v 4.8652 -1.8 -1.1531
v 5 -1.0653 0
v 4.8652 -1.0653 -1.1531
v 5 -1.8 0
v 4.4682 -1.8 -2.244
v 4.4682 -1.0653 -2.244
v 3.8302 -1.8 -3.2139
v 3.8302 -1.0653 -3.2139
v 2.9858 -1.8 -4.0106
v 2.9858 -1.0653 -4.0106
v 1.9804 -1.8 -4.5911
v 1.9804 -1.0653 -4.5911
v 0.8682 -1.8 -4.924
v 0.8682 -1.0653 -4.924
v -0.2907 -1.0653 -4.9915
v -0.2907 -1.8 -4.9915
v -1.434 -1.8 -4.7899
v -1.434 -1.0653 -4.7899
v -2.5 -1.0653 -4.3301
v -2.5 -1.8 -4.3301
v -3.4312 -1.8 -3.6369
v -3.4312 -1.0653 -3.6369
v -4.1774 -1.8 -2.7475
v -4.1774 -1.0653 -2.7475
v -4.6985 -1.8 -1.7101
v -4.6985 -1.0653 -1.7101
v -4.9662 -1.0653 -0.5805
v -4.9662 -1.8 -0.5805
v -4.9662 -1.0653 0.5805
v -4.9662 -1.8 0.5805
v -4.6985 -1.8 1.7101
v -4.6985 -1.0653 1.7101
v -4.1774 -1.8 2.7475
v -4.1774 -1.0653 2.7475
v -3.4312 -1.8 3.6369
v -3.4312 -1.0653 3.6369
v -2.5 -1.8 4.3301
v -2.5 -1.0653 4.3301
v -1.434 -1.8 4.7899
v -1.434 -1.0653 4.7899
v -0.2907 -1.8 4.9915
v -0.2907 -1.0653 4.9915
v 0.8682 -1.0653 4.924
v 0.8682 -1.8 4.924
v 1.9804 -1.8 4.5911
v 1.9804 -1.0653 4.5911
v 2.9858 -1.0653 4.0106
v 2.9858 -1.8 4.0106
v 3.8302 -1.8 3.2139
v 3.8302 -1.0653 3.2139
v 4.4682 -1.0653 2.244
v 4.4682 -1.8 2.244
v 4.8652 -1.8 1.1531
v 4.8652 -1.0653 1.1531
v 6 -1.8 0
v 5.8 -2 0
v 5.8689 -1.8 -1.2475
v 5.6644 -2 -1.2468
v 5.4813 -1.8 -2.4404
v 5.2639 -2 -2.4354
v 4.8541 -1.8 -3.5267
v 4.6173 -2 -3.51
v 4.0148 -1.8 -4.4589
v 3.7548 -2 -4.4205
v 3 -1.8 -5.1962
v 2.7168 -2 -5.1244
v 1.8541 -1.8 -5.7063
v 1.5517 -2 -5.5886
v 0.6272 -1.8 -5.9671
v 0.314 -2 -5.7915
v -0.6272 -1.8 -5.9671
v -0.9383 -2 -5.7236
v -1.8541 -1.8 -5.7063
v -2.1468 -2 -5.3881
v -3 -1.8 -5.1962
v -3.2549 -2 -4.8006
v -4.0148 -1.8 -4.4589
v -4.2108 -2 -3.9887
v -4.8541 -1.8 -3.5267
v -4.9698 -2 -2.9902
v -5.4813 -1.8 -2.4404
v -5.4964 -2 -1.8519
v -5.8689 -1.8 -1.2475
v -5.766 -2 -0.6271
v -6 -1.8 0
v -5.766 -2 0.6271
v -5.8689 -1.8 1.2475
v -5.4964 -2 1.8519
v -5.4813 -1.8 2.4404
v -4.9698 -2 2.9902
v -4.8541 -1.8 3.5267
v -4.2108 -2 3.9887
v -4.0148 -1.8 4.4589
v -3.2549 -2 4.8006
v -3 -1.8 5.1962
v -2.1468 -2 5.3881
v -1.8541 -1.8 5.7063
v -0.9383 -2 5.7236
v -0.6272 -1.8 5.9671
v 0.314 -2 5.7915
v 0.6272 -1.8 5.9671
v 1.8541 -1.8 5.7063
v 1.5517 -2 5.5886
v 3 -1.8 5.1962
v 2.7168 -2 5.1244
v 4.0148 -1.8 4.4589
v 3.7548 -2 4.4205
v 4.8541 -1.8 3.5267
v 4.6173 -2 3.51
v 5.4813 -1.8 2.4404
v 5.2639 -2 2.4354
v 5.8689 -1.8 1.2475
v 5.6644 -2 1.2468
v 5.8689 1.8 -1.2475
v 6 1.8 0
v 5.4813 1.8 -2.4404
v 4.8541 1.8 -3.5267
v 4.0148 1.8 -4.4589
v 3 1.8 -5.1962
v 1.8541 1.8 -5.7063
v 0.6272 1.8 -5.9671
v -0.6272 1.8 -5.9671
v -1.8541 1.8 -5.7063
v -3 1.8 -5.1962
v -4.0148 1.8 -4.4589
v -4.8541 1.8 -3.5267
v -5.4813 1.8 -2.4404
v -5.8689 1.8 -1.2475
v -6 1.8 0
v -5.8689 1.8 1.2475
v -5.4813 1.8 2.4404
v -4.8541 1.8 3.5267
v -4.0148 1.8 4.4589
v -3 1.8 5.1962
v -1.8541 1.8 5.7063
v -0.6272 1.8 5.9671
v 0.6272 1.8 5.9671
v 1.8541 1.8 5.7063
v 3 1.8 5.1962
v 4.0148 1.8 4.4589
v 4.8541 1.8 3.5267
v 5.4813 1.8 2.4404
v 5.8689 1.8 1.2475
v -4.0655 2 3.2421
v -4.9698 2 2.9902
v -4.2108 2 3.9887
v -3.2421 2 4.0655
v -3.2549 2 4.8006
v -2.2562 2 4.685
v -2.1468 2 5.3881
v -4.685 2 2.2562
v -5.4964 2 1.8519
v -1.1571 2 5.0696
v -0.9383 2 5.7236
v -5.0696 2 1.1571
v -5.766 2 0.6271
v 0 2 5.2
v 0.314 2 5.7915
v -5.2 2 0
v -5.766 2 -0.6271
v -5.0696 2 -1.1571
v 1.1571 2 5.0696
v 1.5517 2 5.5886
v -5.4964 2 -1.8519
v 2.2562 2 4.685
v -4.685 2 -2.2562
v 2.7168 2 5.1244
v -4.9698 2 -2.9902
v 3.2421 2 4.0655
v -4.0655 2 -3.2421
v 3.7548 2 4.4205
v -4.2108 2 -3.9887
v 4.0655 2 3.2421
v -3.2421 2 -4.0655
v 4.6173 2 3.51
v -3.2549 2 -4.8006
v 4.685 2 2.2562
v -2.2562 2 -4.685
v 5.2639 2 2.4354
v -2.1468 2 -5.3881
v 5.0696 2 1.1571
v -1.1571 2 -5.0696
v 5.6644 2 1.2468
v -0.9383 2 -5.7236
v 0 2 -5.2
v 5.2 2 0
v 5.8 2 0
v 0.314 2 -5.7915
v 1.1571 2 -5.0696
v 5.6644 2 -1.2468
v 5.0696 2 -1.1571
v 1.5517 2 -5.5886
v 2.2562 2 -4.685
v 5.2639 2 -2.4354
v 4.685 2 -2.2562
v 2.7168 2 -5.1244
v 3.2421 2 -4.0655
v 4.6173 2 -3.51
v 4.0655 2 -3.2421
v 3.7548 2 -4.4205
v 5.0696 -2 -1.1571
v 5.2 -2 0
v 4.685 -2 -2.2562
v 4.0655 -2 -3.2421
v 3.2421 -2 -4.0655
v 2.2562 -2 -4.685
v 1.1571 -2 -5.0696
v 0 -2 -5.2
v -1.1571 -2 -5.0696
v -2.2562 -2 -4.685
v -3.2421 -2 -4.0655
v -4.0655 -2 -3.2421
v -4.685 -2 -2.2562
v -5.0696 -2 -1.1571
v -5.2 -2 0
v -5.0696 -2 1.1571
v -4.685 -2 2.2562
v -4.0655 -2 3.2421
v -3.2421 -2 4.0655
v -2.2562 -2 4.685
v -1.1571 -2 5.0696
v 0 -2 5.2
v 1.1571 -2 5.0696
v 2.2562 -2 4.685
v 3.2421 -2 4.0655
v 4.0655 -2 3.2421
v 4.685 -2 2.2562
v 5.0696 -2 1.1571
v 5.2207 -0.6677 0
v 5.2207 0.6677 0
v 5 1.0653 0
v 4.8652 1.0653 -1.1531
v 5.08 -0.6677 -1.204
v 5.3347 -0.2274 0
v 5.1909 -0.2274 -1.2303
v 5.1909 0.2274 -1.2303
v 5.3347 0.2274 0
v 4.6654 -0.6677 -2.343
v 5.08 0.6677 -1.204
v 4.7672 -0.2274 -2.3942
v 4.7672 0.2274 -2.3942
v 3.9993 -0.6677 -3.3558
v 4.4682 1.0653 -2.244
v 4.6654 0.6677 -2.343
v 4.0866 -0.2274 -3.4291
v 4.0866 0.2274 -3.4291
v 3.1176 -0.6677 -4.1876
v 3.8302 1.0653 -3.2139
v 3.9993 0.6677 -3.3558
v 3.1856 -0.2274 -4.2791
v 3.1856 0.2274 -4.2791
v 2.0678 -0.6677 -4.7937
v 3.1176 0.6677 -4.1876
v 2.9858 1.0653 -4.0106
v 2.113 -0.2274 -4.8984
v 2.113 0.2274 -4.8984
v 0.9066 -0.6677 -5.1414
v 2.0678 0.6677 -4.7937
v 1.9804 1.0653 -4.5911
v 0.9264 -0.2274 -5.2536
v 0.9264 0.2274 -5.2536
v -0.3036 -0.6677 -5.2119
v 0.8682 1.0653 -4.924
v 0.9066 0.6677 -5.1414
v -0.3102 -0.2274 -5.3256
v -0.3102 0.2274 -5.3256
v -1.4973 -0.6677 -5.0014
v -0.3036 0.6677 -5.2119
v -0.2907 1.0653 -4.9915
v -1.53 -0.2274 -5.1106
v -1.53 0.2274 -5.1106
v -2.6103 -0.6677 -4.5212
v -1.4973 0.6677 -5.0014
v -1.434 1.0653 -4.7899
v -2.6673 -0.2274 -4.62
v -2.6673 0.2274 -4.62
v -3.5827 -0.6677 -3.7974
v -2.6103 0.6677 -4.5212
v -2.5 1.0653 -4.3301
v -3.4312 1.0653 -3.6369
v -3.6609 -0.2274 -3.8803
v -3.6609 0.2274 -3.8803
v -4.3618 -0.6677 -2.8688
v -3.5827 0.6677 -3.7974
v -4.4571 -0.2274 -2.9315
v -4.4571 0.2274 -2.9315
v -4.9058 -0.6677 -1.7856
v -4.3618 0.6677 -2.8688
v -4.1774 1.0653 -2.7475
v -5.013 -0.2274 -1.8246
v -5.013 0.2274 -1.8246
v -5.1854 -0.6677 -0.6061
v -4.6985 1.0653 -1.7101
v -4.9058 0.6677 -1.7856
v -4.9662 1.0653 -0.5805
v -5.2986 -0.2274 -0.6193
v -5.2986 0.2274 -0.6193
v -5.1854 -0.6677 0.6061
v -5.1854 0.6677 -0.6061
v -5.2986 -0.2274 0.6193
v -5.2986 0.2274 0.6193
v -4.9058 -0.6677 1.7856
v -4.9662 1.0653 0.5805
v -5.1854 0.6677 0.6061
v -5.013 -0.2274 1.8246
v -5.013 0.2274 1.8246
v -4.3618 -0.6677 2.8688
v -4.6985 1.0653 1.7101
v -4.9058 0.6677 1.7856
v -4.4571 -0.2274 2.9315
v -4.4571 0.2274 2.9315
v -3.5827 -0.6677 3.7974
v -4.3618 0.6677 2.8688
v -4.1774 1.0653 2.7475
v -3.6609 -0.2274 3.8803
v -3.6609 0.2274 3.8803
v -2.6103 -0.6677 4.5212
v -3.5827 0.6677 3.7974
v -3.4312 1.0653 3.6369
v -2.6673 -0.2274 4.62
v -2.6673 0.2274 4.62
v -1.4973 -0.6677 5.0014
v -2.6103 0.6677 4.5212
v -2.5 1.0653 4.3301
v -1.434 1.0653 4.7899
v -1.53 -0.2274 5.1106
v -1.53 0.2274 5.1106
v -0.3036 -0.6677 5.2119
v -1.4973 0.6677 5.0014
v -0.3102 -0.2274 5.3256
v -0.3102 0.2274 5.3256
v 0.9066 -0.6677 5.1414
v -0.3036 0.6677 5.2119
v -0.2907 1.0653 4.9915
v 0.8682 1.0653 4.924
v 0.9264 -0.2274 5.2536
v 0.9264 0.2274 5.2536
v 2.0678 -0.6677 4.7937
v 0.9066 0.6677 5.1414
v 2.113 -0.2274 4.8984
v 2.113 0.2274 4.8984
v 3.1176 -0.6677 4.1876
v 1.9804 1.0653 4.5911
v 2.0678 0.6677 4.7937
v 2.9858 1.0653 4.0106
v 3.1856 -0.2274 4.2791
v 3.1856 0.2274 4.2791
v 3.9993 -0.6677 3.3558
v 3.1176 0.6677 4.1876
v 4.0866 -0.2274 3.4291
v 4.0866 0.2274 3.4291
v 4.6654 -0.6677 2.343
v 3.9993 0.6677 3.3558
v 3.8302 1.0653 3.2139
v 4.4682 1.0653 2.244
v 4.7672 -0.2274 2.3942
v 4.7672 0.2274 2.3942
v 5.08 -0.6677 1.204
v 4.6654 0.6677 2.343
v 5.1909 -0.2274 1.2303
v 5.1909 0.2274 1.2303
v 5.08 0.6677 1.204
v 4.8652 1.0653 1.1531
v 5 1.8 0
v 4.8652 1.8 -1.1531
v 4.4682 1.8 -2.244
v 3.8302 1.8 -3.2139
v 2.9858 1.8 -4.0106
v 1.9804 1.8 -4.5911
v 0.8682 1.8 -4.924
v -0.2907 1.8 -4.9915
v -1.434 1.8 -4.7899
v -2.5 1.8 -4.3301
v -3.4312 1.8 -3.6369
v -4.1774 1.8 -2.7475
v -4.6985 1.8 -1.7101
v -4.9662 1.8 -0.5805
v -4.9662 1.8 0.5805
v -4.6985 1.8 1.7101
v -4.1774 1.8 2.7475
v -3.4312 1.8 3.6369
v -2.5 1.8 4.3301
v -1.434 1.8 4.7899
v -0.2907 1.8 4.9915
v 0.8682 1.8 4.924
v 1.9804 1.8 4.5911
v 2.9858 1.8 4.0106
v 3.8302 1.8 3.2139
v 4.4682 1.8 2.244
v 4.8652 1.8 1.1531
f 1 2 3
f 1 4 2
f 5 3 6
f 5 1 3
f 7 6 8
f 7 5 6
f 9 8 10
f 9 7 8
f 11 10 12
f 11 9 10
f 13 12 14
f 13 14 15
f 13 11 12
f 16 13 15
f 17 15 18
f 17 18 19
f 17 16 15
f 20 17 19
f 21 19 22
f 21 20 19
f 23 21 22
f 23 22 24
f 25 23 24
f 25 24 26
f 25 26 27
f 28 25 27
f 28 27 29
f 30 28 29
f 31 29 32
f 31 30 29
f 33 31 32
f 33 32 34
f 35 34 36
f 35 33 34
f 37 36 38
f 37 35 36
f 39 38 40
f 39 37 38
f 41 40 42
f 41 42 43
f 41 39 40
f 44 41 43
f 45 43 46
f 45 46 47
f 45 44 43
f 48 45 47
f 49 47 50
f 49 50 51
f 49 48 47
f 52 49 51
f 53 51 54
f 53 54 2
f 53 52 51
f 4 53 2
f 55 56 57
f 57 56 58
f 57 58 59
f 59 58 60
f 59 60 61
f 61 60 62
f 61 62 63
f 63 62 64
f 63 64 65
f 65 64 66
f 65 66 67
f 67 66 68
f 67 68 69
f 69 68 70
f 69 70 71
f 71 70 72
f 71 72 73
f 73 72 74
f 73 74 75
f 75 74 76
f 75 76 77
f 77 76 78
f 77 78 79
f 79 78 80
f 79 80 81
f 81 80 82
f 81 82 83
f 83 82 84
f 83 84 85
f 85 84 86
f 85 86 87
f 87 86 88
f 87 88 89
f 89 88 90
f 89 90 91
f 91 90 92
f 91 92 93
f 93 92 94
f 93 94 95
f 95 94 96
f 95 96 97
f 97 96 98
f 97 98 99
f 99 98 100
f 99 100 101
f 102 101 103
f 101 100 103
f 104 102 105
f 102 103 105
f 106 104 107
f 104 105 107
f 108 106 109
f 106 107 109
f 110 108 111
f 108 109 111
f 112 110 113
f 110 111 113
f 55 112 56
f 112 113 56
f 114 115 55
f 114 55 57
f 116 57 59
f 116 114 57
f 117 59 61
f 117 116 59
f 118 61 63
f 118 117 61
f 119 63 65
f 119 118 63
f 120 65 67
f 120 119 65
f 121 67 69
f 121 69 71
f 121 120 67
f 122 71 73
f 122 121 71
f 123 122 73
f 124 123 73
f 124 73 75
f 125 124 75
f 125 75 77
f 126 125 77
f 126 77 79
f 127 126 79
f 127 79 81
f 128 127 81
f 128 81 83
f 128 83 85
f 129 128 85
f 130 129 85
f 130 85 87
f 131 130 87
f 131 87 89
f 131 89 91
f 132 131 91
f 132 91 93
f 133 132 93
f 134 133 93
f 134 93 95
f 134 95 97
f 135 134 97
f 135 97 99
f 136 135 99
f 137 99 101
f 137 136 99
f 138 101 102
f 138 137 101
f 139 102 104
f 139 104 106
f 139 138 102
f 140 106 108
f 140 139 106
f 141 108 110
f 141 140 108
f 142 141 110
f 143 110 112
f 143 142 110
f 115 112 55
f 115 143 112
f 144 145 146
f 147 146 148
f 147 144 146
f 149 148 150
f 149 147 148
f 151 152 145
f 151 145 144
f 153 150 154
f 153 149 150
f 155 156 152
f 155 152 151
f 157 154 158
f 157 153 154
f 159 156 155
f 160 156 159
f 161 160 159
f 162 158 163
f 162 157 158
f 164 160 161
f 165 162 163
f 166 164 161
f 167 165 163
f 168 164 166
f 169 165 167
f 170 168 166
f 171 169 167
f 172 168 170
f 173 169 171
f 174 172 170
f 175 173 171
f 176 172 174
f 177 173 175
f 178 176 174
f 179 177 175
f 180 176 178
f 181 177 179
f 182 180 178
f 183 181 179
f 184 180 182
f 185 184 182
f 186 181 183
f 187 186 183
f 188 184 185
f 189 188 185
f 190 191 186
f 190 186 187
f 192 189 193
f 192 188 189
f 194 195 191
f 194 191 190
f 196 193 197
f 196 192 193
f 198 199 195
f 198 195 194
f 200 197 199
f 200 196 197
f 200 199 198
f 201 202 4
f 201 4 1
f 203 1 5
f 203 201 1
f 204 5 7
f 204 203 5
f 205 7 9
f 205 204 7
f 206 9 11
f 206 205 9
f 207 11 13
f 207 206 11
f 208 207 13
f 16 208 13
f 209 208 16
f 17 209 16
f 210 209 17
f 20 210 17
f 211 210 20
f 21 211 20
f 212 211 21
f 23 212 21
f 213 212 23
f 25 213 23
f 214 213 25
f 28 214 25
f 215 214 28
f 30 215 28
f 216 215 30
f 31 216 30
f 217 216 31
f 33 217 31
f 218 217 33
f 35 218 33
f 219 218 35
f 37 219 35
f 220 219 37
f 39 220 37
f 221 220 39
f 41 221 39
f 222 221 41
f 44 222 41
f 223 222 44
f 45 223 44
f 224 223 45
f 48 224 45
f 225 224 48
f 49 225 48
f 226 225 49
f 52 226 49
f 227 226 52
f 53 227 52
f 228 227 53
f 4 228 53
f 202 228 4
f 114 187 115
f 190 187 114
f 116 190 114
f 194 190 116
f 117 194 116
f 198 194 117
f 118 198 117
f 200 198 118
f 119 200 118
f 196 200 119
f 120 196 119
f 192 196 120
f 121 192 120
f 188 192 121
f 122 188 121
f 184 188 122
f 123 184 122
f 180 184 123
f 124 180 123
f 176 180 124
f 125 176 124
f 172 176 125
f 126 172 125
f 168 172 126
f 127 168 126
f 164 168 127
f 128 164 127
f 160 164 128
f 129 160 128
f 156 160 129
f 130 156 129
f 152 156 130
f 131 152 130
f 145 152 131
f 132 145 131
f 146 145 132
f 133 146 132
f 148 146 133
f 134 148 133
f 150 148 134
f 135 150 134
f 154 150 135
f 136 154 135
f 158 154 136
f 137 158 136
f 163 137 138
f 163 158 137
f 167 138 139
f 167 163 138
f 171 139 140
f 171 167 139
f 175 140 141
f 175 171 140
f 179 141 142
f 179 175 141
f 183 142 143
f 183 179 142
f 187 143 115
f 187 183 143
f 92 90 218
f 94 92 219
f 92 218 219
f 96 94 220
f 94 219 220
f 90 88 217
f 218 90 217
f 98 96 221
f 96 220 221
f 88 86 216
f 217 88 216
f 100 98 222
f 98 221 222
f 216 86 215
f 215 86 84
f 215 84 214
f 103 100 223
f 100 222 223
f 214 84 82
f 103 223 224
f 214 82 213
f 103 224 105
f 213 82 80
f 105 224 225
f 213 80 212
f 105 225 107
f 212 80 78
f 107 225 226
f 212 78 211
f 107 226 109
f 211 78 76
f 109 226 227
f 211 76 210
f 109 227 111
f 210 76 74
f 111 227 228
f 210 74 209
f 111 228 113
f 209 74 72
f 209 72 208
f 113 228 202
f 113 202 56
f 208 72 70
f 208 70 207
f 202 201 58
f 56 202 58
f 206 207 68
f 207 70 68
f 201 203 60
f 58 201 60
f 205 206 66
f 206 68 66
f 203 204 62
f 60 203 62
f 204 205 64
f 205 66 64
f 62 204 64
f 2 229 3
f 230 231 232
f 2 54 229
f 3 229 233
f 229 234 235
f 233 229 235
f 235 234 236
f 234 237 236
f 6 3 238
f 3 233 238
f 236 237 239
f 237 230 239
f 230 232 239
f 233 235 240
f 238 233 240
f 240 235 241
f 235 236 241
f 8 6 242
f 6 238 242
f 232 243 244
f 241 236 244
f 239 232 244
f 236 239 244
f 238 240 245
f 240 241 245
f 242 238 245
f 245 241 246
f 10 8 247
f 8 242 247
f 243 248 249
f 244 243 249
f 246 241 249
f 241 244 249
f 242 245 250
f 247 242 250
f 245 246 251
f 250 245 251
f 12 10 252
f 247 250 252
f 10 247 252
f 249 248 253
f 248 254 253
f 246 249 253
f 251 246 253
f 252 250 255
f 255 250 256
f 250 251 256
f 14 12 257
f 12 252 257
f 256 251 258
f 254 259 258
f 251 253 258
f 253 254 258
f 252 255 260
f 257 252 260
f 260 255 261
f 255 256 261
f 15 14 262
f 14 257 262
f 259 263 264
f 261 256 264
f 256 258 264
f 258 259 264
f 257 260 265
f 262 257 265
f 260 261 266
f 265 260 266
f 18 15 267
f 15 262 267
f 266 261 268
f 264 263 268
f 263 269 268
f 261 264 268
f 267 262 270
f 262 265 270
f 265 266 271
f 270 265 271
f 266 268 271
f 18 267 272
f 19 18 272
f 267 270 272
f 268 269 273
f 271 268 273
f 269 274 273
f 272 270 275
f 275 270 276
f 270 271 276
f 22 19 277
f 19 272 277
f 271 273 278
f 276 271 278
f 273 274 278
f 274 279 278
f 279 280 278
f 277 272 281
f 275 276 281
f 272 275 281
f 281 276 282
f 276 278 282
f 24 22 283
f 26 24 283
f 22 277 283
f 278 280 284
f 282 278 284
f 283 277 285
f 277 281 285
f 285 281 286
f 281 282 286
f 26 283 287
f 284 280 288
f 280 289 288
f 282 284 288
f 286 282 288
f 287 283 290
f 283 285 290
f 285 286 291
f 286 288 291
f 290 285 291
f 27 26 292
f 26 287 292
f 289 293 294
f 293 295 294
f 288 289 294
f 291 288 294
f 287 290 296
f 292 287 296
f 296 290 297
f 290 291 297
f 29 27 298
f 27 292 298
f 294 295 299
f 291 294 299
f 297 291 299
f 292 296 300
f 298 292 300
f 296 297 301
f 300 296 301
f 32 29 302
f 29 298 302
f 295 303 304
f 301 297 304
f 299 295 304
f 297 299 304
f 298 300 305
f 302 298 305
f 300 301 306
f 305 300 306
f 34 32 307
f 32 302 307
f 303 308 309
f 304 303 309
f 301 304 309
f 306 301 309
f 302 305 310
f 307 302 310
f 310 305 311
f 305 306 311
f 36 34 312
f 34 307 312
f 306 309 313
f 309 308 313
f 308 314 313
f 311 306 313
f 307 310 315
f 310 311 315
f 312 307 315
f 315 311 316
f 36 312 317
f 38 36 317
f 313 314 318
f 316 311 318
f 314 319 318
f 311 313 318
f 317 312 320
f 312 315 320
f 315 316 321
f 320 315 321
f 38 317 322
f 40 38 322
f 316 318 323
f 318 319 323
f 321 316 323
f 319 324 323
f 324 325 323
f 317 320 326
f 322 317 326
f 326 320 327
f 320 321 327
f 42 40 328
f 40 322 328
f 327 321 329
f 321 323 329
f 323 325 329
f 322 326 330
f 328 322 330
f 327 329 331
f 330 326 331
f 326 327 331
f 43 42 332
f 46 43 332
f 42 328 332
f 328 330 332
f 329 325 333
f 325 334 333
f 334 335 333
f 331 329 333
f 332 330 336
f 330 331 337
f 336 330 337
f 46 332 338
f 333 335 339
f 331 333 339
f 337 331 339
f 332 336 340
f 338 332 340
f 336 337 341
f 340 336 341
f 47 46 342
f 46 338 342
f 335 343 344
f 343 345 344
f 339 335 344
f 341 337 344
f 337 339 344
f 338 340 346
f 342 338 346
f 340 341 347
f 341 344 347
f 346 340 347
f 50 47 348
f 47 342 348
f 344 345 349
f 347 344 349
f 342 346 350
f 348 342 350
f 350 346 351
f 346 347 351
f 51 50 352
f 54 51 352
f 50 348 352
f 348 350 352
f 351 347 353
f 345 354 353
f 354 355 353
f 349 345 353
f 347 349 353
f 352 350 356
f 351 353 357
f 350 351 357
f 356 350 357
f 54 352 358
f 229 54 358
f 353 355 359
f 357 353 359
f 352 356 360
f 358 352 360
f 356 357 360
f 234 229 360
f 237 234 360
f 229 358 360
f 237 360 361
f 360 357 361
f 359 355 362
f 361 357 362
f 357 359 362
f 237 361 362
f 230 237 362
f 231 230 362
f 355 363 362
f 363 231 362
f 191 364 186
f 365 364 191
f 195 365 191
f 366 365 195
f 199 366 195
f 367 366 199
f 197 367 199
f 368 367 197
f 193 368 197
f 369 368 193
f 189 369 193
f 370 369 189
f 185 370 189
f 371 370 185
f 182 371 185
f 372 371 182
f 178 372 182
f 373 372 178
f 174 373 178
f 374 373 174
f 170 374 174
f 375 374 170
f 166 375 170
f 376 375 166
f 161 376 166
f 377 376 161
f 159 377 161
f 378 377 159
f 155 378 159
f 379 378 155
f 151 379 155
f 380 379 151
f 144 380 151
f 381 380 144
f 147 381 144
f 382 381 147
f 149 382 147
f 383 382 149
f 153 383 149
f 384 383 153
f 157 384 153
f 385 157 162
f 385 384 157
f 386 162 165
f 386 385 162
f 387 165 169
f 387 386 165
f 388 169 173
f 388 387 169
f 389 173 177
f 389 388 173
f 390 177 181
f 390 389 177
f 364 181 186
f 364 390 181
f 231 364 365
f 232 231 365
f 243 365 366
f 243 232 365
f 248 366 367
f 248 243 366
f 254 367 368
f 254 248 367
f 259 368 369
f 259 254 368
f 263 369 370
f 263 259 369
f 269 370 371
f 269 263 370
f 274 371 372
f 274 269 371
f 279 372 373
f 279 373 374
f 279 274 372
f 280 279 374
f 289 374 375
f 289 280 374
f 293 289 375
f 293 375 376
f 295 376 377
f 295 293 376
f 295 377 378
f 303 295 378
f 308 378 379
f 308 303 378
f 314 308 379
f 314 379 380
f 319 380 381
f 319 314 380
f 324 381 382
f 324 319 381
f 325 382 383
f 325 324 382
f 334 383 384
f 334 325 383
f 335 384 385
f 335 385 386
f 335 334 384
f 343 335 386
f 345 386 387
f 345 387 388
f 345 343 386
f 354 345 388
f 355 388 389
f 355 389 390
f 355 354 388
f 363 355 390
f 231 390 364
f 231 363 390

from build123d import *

# Parameters (mm, degrees)
SKETCH1_R           = 6
SKETCH1_R_2         = 5
BOSS_EXTRUDE1_DEPTH = 2
CHAMFER1_SIZE       = 0.2
SKETCH2_R           = 1.8


with BuildPart() as part:
    # Sketch1 → Boss-Extrude1 (new body, symmetric)
    with BuildSketch(Plane(origin=(0, 0, 0), x_dir=(1, 0, 0), z_dir=(0, 1, 0))):
        Circle(SKETCH1_R)
        Circle(SKETCH1_R_2, mode=Mode.SUBTRACT)
    extrude(amount=BOSS_EXTRUDE1_DEPTH, both=True)

    # Chamfer1
    chamfer1_edges = [part.edges().sort_by_distance(p)[0] for p in [
        (-6, -2, 0),
        (-6, 2, 0),
        (-5, -2, 0),
        (-5, 2, 0),
    ]]
    chamfer(chamfer1_edges, length=CHAMFER1_SIZE)

    # Cut-Sweep1: sweep along a path in Sketch3
    with BuildLine(Plane(origin=(0, 0, 0), x_dir=(1, 0, 0), z_dir=(0, 1, 0))) as cut_sweep1_path:
        CenterArc((0, 0), 3.542184236, 0, 360)
    # Sketch2 → Cut-Sweep1 (sweep, cut)
    with BuildSketch(Plane(origin=(0, 0, 0), x_dir=(0, 0, -1), z_dir=(1, 0, 0))):
        with Locations((-3.549093178, 0)):
            Circle(SKETCH2_R)
    sweep(path=cut_sweep1_path.line, mode=Mode.SUBTRACT)


solid = part.part
